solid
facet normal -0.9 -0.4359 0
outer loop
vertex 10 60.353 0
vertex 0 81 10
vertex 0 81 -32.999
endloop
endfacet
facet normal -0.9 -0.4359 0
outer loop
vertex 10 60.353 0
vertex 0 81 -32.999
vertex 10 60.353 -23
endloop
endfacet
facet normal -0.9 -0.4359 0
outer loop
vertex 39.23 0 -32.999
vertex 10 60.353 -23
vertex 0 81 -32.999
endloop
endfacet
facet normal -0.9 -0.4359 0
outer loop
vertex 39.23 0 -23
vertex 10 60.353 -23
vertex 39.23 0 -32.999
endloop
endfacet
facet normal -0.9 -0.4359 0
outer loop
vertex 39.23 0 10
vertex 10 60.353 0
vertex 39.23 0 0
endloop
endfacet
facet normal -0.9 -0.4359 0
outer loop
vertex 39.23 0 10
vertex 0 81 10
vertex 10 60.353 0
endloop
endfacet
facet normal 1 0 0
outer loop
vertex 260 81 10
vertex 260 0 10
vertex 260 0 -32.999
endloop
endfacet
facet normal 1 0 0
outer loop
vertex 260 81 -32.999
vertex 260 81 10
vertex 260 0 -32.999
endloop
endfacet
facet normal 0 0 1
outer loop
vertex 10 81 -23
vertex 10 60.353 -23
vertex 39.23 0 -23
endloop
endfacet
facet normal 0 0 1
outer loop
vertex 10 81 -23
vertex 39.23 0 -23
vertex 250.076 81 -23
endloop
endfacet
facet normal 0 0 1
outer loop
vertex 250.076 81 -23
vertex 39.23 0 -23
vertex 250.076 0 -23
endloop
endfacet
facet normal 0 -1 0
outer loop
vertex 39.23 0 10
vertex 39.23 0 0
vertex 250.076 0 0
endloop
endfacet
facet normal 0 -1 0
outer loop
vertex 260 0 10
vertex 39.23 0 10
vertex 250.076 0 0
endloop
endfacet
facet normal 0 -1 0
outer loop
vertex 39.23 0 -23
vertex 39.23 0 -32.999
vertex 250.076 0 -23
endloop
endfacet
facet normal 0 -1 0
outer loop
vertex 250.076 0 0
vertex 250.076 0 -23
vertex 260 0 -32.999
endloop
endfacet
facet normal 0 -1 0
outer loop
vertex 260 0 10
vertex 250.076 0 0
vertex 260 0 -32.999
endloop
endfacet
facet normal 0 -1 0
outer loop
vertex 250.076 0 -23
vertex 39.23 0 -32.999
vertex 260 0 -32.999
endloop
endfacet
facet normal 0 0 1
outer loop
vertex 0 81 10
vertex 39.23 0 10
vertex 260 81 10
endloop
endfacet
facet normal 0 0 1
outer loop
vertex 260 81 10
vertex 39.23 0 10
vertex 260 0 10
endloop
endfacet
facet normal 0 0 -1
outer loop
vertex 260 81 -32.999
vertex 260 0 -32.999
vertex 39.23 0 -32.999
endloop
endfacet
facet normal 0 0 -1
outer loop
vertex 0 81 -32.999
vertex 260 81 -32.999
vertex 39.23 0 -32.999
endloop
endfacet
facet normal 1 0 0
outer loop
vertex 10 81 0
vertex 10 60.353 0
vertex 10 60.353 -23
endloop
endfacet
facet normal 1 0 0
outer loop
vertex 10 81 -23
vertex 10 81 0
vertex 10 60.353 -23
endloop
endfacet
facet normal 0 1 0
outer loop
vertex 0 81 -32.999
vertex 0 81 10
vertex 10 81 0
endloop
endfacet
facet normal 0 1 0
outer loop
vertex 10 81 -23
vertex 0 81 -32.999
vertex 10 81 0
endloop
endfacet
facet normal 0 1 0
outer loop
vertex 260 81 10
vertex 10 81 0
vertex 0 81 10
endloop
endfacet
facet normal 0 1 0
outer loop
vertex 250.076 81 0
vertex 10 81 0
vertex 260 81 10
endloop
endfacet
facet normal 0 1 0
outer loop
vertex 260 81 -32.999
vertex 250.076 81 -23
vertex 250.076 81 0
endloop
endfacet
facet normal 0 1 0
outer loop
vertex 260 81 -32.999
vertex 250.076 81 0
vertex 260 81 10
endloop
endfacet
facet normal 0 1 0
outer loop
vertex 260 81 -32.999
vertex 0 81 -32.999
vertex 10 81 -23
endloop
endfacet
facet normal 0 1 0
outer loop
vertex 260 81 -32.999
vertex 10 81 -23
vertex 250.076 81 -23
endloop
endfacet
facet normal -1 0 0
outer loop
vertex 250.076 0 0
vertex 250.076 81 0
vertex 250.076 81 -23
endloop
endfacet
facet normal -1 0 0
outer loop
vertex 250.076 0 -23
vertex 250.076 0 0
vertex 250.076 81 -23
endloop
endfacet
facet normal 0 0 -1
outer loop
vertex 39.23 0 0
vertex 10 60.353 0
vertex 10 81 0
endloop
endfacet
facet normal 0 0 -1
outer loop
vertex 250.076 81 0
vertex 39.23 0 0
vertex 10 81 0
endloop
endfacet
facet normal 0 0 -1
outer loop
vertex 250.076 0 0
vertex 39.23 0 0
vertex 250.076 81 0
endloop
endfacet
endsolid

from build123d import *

# Parameters (mm, degrees)
ESQUISSE5_W                  = 10
ESQUISSE5_H                  = 23
ESQUISSE5_W_2                = 260
ESQUISSE5_H_2                = 10
ESQUISSE5_W_3                = 9.9238066
BOSS_EXTRU_4_DEPTH           = 81
ENL_V_MAT_EXTRU_2_DEPTH      = 2
ENL_V_MAT_EXTRU_2_DEPTH_BACK = 227


with BuildPart() as part:
    # Esquisse5 → Boss.-Extru.4 (new body)
    with BuildSketch(Plane(origin=(0, 0, 0), x_dir=(1, 0, 0), z_dir=(0, 1, 0))):
        Polygon((0, 32.998552378), (0, 23), (10, 23), (250.0761934, 23), (260, 23), (260, 32.998552378), align=None)
        with Locations((5, 11.5)):
            Rectangle(ESQUISSE5_W, ESQUISSE5_H)
        with Locations((130, -5)):
            Rectangle(ESQUISSE5_W_2, ESQUISSE5_H_2)
        with Locations((255.0380967, 11.5)):
            Rectangle(ESQUISSE5_W_3, ESQUISSE5_H)
    extrude(amount=BOSS_EXTRU_4_DEPTH)

    # Esquisse7 → Enlèv. mat.-Extru.2 (cut, two sides: drawn at the far end of the back side and taken through both)
    with BuildSketch(Plane(origin=(0, 0, -32.998552378), x_dir=(-1, 0, 0), z_dir=(0, 0, -1)).offset(-ENL_V_MAT_EXTRU_2_DEPTH_BACK)):
        Polygon((0, 0), (0, 81), (-39.230090492, 0), align=None)
    extrude(amount=ENL_V_MAT_EXTRU_2_DEPTH + ENL_V_MAT_EXTRU_2_DEPTH_BACK, mode=Mode.SUBTRACT)


solid = part.part
